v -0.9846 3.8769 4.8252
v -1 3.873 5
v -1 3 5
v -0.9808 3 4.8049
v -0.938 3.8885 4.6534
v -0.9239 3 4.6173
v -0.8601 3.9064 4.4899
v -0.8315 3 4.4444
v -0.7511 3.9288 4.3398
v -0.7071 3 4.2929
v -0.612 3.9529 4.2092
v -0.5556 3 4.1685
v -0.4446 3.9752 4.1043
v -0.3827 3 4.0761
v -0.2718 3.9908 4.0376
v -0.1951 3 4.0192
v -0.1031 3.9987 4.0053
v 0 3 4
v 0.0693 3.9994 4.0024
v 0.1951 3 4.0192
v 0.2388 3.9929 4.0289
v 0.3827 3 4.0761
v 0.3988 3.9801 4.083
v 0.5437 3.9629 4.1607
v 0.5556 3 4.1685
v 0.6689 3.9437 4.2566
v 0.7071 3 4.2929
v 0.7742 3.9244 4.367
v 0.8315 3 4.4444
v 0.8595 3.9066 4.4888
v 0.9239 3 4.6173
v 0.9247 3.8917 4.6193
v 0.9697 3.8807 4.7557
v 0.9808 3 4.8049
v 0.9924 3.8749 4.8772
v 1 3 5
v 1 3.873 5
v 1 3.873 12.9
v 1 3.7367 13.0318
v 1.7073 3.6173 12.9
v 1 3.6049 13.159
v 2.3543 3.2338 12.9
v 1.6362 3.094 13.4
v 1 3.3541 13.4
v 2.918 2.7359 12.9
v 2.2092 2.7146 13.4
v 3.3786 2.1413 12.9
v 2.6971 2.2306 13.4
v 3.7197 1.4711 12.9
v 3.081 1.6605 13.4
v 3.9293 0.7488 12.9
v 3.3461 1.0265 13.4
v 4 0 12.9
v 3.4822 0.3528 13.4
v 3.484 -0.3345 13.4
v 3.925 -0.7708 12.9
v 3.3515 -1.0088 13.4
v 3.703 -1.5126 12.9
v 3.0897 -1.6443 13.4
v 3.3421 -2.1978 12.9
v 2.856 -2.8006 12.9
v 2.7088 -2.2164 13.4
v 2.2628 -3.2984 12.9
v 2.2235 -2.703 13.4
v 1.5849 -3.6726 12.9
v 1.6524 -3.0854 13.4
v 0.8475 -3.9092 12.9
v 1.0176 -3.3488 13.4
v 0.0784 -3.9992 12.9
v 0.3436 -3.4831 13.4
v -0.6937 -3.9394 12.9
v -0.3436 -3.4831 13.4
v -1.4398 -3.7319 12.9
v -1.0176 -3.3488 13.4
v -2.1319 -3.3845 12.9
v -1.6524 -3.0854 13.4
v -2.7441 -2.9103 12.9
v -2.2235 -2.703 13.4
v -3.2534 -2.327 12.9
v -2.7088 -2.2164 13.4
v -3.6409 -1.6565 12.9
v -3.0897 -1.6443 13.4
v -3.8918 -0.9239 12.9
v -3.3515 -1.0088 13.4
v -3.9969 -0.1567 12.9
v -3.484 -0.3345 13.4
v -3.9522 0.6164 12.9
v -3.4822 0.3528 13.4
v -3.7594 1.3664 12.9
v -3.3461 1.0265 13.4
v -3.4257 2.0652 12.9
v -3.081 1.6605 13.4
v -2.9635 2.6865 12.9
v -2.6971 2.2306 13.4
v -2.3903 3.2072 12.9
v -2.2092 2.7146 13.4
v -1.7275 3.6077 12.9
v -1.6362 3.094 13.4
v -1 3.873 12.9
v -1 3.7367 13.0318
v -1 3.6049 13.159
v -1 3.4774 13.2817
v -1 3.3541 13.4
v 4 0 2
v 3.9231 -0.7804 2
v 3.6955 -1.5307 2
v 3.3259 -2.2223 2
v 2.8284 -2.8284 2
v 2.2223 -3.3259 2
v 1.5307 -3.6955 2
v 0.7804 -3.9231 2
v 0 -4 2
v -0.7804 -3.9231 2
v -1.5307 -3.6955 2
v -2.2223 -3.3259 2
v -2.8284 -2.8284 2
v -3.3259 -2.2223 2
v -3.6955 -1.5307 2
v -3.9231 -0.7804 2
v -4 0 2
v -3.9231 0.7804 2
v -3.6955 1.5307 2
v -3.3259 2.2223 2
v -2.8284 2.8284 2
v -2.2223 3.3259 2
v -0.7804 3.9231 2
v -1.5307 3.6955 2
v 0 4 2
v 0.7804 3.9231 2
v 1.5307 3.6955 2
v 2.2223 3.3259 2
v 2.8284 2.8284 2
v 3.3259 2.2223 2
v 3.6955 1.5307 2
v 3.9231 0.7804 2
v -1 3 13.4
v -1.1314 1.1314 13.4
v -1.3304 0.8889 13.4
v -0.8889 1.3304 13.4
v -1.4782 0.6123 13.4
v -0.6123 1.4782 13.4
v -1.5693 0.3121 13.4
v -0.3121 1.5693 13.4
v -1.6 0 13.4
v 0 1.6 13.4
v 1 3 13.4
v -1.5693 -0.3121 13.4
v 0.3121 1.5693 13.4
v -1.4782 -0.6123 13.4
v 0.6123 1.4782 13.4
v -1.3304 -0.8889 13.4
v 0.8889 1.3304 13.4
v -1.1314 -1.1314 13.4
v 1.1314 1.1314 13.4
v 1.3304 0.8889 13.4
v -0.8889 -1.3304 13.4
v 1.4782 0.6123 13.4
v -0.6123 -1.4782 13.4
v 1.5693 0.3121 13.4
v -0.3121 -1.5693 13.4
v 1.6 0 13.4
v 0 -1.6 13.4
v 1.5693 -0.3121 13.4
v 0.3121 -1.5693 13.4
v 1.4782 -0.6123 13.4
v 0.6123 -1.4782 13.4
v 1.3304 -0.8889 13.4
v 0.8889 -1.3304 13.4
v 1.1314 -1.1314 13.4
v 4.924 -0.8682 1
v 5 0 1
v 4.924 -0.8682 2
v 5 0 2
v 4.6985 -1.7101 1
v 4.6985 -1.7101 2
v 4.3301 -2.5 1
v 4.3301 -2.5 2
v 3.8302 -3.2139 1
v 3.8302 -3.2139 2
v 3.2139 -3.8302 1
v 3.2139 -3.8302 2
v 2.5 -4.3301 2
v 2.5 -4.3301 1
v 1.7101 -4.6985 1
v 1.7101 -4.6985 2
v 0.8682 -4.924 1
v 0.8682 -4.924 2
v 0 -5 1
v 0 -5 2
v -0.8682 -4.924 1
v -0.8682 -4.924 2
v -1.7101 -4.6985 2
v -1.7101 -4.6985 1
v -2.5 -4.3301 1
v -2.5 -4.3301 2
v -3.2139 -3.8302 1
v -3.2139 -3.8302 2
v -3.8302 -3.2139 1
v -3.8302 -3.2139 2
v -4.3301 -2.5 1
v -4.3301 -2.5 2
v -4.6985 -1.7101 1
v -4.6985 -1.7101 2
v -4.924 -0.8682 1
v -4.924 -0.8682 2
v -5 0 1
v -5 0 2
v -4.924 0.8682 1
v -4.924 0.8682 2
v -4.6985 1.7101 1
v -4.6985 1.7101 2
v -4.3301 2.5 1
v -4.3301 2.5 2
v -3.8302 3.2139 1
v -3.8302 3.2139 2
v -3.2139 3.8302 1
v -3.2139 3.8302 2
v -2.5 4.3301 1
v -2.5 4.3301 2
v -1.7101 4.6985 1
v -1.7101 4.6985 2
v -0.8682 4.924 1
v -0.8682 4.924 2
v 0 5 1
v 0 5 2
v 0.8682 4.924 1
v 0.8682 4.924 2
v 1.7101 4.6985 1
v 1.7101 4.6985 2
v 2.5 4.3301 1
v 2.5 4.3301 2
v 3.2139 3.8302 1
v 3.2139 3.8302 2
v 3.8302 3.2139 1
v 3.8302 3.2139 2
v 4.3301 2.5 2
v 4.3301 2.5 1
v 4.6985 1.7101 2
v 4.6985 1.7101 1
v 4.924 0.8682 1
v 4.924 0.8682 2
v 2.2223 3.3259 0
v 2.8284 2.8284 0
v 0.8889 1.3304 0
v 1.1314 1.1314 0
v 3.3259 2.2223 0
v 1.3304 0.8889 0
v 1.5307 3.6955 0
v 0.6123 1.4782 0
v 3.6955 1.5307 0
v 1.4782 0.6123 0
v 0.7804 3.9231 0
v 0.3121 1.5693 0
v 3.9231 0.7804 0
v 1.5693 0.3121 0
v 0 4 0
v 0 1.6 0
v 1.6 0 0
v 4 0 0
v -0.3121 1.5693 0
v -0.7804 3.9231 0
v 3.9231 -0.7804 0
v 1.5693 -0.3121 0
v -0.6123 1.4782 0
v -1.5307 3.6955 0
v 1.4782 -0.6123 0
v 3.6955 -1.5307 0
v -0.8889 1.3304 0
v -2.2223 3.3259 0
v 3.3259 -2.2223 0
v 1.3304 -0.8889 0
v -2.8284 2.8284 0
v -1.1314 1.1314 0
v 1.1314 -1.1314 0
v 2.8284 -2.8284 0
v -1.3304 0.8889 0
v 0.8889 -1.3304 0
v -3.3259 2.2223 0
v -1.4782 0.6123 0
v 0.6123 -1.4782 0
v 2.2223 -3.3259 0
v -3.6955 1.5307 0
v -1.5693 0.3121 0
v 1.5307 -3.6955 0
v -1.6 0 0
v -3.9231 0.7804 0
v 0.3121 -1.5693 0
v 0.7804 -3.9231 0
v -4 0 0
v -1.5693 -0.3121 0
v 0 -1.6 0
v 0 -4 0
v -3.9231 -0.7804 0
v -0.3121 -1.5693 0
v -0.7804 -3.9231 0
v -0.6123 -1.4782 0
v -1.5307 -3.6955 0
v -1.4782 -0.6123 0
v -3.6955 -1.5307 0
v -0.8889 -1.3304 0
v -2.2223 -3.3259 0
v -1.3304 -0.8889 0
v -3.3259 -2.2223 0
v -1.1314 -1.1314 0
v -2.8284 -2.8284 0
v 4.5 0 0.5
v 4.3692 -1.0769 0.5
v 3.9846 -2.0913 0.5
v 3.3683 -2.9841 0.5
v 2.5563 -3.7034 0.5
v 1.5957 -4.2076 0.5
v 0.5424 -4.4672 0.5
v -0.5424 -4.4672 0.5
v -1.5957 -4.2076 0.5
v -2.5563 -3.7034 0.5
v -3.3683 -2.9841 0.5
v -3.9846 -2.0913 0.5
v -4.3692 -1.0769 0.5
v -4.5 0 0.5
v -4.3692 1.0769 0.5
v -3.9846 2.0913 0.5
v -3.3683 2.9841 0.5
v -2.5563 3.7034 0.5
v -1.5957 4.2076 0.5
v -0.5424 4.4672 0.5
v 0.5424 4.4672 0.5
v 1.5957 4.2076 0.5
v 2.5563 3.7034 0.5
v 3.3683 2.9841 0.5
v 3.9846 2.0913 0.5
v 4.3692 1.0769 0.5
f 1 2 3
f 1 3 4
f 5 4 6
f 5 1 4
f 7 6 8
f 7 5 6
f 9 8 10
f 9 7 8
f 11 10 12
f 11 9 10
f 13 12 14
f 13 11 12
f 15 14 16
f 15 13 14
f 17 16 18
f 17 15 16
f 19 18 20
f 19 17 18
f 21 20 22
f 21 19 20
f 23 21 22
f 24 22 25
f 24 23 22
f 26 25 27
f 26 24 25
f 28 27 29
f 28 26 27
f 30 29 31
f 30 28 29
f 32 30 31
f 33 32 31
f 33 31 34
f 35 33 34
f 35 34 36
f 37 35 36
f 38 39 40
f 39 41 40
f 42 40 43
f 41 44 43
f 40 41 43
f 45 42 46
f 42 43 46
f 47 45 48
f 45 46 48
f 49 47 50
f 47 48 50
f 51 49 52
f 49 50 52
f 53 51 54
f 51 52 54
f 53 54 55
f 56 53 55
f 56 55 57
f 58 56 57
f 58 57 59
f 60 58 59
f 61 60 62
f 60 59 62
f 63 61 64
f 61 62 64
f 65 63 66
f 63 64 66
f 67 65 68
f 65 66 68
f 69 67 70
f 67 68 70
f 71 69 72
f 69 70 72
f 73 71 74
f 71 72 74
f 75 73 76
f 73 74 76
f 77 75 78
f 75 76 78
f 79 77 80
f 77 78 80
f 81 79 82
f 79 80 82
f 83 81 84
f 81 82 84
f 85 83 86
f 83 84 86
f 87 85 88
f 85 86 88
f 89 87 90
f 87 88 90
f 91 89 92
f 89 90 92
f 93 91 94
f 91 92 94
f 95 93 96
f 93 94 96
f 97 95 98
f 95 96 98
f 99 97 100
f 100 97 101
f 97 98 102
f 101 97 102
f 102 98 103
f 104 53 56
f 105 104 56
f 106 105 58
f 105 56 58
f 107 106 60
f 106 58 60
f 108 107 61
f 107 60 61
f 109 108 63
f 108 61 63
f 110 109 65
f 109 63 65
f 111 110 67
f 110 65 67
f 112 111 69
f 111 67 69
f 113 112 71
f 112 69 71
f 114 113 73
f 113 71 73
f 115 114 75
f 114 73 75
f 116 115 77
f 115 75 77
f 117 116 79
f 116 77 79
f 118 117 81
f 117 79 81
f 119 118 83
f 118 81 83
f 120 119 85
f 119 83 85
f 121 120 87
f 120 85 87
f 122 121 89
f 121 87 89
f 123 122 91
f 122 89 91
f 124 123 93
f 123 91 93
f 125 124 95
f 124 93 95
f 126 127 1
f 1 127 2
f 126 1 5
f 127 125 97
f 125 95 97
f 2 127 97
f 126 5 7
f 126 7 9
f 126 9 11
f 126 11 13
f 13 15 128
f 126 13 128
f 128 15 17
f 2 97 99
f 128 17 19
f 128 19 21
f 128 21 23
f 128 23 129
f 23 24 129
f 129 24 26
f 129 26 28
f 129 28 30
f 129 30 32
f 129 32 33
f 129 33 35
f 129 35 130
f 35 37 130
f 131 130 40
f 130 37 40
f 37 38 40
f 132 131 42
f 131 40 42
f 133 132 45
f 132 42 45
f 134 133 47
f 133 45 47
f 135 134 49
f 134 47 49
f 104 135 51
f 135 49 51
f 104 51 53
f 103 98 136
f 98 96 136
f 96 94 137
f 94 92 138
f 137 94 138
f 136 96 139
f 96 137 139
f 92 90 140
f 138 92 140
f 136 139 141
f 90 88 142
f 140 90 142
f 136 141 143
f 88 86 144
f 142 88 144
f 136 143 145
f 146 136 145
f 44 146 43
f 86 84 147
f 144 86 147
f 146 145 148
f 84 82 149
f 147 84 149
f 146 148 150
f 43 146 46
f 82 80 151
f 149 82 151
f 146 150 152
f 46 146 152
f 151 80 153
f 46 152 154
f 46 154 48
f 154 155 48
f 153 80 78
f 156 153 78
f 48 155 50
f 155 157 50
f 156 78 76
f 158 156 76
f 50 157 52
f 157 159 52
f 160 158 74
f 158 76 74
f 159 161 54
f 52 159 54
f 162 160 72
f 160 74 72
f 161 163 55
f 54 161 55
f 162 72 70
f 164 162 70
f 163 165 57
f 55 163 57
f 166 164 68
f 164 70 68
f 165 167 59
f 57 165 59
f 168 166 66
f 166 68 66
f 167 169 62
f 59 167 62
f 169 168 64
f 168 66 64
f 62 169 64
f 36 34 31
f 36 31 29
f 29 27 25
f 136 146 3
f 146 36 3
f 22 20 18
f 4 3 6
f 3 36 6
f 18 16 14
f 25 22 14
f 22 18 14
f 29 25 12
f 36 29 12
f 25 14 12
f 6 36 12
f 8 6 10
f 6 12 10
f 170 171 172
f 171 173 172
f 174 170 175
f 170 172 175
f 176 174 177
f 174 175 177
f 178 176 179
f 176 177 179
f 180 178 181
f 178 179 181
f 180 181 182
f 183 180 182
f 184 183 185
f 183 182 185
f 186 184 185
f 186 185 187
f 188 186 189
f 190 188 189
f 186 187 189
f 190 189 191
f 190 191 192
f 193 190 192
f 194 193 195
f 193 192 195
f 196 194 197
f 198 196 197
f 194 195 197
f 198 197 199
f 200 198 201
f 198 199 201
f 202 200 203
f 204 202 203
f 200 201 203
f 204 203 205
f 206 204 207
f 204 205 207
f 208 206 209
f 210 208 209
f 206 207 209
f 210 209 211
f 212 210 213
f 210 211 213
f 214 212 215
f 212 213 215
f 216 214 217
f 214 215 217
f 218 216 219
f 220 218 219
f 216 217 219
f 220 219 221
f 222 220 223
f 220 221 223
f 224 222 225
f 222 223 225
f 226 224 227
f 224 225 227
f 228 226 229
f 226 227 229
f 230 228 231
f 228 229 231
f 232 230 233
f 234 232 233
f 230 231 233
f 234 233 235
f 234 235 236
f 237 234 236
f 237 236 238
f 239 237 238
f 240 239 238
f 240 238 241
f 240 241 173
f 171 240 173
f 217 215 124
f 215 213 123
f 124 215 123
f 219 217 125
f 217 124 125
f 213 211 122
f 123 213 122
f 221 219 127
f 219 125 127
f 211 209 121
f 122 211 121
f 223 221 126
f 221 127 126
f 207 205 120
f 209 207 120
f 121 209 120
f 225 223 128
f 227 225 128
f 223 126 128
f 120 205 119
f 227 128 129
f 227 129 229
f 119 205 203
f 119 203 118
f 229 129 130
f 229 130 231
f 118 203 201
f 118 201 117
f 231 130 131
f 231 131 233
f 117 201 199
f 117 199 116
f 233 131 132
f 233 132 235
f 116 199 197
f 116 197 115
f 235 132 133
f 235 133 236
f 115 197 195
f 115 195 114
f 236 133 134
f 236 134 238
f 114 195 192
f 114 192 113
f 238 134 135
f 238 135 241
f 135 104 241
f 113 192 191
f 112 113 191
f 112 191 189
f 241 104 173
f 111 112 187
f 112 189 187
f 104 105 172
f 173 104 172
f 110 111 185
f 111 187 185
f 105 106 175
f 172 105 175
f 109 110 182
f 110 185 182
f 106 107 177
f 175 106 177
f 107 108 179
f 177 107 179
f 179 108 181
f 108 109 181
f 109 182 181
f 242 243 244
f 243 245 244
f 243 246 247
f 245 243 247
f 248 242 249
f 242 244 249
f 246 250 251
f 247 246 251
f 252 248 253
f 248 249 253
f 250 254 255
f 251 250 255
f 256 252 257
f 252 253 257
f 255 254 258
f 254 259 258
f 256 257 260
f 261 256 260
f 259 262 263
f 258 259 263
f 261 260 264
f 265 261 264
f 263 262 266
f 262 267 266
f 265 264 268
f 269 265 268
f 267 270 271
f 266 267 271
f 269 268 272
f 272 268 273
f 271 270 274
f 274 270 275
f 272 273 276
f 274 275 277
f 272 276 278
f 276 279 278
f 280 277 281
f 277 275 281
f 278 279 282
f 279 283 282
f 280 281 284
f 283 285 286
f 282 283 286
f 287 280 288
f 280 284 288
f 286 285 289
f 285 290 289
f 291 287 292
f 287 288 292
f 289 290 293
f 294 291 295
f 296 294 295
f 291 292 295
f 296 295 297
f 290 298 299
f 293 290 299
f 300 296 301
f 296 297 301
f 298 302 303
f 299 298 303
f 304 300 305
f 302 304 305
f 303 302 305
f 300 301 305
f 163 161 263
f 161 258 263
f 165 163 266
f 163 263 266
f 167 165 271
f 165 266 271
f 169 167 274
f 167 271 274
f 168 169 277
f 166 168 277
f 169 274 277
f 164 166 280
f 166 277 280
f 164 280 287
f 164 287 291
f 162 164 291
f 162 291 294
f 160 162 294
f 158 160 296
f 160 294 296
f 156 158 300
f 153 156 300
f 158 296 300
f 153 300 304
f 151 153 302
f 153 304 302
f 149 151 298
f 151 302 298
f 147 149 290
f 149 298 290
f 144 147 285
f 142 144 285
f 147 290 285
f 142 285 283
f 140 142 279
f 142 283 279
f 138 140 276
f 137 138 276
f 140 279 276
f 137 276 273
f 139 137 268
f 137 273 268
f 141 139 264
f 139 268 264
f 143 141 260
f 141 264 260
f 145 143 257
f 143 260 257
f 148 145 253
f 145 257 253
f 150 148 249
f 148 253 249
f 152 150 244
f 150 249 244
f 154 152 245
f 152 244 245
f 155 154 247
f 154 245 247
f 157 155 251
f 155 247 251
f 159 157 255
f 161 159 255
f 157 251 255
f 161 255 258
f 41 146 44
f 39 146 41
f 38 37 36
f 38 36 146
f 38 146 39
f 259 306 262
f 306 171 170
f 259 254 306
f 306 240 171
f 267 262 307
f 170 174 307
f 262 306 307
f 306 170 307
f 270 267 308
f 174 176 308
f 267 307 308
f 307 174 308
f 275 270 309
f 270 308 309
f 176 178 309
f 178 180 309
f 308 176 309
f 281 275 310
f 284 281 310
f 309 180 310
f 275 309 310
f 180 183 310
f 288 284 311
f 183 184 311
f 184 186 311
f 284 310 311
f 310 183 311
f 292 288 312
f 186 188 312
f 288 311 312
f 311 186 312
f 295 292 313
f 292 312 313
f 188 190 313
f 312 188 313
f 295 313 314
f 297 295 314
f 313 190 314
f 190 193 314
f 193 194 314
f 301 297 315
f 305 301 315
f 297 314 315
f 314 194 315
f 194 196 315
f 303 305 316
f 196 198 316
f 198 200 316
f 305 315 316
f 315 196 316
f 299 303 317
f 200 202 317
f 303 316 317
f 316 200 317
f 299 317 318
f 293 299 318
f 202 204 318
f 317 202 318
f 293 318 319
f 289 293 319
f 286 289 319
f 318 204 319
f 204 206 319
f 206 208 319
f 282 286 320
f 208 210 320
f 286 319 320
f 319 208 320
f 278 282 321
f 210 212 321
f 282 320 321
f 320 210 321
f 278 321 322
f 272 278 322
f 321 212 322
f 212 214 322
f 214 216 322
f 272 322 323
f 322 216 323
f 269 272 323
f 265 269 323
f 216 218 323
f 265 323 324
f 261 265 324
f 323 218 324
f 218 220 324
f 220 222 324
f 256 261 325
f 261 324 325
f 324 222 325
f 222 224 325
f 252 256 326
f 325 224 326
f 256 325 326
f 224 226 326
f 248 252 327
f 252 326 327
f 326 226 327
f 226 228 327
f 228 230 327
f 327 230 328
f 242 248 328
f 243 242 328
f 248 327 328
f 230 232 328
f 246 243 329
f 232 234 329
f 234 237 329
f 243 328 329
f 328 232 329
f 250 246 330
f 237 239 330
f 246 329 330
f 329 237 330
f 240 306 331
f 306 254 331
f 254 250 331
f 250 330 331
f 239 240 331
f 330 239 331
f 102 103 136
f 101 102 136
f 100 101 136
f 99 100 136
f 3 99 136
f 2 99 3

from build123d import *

# Parameters (mm, degrees)
CUT_EXTRUDE1_DEPTH = 1


with BuildPart() as part:
    # Sketch1 → Revolve1 (revolve)
    with BuildSketch(Plane(origin=(0, 0, 0), x_dir=(0, 0, -1), z_dir=(1, 0, 0)), mode=Mode.PRIVATE) as revolve1_sk:
        Polygon((0, 1.6), (0, 4), (-1, 5), (-2, 5), (-2, 4), (-12.9, 4), (-13.4, 3.5), (-13.4, 1.6), align=None)
    revolve(revolve1_sk.sketch.rotate(Axis((0, 0, 0), (0, 0, -1)), 90), axis=Axis((0, 0, 0), (0, 0, -1)))

    # Sketch2 → Cut-Extrude1 (cut)
    with BuildSketch(Plane(origin=(0, 4, 0), x_dir=(1, 0, 0), z_dir=(0, 1, 0))):
        with BuildLine():
            Line((-1, -13.4), (-1, -5))
            ThreePointArc((-1, -5), (0, -4), (1, -5))
            Line((1, -5), (1, -13.4))
            ThreePointArc((1, -13.4), (0, -14.4), (-1, -13.4))
        make_face()
    extrude(amount=-CUT_EXTRUDE1_DEPTH, mode=Mode.SUBTRACT)


solid = part.part
